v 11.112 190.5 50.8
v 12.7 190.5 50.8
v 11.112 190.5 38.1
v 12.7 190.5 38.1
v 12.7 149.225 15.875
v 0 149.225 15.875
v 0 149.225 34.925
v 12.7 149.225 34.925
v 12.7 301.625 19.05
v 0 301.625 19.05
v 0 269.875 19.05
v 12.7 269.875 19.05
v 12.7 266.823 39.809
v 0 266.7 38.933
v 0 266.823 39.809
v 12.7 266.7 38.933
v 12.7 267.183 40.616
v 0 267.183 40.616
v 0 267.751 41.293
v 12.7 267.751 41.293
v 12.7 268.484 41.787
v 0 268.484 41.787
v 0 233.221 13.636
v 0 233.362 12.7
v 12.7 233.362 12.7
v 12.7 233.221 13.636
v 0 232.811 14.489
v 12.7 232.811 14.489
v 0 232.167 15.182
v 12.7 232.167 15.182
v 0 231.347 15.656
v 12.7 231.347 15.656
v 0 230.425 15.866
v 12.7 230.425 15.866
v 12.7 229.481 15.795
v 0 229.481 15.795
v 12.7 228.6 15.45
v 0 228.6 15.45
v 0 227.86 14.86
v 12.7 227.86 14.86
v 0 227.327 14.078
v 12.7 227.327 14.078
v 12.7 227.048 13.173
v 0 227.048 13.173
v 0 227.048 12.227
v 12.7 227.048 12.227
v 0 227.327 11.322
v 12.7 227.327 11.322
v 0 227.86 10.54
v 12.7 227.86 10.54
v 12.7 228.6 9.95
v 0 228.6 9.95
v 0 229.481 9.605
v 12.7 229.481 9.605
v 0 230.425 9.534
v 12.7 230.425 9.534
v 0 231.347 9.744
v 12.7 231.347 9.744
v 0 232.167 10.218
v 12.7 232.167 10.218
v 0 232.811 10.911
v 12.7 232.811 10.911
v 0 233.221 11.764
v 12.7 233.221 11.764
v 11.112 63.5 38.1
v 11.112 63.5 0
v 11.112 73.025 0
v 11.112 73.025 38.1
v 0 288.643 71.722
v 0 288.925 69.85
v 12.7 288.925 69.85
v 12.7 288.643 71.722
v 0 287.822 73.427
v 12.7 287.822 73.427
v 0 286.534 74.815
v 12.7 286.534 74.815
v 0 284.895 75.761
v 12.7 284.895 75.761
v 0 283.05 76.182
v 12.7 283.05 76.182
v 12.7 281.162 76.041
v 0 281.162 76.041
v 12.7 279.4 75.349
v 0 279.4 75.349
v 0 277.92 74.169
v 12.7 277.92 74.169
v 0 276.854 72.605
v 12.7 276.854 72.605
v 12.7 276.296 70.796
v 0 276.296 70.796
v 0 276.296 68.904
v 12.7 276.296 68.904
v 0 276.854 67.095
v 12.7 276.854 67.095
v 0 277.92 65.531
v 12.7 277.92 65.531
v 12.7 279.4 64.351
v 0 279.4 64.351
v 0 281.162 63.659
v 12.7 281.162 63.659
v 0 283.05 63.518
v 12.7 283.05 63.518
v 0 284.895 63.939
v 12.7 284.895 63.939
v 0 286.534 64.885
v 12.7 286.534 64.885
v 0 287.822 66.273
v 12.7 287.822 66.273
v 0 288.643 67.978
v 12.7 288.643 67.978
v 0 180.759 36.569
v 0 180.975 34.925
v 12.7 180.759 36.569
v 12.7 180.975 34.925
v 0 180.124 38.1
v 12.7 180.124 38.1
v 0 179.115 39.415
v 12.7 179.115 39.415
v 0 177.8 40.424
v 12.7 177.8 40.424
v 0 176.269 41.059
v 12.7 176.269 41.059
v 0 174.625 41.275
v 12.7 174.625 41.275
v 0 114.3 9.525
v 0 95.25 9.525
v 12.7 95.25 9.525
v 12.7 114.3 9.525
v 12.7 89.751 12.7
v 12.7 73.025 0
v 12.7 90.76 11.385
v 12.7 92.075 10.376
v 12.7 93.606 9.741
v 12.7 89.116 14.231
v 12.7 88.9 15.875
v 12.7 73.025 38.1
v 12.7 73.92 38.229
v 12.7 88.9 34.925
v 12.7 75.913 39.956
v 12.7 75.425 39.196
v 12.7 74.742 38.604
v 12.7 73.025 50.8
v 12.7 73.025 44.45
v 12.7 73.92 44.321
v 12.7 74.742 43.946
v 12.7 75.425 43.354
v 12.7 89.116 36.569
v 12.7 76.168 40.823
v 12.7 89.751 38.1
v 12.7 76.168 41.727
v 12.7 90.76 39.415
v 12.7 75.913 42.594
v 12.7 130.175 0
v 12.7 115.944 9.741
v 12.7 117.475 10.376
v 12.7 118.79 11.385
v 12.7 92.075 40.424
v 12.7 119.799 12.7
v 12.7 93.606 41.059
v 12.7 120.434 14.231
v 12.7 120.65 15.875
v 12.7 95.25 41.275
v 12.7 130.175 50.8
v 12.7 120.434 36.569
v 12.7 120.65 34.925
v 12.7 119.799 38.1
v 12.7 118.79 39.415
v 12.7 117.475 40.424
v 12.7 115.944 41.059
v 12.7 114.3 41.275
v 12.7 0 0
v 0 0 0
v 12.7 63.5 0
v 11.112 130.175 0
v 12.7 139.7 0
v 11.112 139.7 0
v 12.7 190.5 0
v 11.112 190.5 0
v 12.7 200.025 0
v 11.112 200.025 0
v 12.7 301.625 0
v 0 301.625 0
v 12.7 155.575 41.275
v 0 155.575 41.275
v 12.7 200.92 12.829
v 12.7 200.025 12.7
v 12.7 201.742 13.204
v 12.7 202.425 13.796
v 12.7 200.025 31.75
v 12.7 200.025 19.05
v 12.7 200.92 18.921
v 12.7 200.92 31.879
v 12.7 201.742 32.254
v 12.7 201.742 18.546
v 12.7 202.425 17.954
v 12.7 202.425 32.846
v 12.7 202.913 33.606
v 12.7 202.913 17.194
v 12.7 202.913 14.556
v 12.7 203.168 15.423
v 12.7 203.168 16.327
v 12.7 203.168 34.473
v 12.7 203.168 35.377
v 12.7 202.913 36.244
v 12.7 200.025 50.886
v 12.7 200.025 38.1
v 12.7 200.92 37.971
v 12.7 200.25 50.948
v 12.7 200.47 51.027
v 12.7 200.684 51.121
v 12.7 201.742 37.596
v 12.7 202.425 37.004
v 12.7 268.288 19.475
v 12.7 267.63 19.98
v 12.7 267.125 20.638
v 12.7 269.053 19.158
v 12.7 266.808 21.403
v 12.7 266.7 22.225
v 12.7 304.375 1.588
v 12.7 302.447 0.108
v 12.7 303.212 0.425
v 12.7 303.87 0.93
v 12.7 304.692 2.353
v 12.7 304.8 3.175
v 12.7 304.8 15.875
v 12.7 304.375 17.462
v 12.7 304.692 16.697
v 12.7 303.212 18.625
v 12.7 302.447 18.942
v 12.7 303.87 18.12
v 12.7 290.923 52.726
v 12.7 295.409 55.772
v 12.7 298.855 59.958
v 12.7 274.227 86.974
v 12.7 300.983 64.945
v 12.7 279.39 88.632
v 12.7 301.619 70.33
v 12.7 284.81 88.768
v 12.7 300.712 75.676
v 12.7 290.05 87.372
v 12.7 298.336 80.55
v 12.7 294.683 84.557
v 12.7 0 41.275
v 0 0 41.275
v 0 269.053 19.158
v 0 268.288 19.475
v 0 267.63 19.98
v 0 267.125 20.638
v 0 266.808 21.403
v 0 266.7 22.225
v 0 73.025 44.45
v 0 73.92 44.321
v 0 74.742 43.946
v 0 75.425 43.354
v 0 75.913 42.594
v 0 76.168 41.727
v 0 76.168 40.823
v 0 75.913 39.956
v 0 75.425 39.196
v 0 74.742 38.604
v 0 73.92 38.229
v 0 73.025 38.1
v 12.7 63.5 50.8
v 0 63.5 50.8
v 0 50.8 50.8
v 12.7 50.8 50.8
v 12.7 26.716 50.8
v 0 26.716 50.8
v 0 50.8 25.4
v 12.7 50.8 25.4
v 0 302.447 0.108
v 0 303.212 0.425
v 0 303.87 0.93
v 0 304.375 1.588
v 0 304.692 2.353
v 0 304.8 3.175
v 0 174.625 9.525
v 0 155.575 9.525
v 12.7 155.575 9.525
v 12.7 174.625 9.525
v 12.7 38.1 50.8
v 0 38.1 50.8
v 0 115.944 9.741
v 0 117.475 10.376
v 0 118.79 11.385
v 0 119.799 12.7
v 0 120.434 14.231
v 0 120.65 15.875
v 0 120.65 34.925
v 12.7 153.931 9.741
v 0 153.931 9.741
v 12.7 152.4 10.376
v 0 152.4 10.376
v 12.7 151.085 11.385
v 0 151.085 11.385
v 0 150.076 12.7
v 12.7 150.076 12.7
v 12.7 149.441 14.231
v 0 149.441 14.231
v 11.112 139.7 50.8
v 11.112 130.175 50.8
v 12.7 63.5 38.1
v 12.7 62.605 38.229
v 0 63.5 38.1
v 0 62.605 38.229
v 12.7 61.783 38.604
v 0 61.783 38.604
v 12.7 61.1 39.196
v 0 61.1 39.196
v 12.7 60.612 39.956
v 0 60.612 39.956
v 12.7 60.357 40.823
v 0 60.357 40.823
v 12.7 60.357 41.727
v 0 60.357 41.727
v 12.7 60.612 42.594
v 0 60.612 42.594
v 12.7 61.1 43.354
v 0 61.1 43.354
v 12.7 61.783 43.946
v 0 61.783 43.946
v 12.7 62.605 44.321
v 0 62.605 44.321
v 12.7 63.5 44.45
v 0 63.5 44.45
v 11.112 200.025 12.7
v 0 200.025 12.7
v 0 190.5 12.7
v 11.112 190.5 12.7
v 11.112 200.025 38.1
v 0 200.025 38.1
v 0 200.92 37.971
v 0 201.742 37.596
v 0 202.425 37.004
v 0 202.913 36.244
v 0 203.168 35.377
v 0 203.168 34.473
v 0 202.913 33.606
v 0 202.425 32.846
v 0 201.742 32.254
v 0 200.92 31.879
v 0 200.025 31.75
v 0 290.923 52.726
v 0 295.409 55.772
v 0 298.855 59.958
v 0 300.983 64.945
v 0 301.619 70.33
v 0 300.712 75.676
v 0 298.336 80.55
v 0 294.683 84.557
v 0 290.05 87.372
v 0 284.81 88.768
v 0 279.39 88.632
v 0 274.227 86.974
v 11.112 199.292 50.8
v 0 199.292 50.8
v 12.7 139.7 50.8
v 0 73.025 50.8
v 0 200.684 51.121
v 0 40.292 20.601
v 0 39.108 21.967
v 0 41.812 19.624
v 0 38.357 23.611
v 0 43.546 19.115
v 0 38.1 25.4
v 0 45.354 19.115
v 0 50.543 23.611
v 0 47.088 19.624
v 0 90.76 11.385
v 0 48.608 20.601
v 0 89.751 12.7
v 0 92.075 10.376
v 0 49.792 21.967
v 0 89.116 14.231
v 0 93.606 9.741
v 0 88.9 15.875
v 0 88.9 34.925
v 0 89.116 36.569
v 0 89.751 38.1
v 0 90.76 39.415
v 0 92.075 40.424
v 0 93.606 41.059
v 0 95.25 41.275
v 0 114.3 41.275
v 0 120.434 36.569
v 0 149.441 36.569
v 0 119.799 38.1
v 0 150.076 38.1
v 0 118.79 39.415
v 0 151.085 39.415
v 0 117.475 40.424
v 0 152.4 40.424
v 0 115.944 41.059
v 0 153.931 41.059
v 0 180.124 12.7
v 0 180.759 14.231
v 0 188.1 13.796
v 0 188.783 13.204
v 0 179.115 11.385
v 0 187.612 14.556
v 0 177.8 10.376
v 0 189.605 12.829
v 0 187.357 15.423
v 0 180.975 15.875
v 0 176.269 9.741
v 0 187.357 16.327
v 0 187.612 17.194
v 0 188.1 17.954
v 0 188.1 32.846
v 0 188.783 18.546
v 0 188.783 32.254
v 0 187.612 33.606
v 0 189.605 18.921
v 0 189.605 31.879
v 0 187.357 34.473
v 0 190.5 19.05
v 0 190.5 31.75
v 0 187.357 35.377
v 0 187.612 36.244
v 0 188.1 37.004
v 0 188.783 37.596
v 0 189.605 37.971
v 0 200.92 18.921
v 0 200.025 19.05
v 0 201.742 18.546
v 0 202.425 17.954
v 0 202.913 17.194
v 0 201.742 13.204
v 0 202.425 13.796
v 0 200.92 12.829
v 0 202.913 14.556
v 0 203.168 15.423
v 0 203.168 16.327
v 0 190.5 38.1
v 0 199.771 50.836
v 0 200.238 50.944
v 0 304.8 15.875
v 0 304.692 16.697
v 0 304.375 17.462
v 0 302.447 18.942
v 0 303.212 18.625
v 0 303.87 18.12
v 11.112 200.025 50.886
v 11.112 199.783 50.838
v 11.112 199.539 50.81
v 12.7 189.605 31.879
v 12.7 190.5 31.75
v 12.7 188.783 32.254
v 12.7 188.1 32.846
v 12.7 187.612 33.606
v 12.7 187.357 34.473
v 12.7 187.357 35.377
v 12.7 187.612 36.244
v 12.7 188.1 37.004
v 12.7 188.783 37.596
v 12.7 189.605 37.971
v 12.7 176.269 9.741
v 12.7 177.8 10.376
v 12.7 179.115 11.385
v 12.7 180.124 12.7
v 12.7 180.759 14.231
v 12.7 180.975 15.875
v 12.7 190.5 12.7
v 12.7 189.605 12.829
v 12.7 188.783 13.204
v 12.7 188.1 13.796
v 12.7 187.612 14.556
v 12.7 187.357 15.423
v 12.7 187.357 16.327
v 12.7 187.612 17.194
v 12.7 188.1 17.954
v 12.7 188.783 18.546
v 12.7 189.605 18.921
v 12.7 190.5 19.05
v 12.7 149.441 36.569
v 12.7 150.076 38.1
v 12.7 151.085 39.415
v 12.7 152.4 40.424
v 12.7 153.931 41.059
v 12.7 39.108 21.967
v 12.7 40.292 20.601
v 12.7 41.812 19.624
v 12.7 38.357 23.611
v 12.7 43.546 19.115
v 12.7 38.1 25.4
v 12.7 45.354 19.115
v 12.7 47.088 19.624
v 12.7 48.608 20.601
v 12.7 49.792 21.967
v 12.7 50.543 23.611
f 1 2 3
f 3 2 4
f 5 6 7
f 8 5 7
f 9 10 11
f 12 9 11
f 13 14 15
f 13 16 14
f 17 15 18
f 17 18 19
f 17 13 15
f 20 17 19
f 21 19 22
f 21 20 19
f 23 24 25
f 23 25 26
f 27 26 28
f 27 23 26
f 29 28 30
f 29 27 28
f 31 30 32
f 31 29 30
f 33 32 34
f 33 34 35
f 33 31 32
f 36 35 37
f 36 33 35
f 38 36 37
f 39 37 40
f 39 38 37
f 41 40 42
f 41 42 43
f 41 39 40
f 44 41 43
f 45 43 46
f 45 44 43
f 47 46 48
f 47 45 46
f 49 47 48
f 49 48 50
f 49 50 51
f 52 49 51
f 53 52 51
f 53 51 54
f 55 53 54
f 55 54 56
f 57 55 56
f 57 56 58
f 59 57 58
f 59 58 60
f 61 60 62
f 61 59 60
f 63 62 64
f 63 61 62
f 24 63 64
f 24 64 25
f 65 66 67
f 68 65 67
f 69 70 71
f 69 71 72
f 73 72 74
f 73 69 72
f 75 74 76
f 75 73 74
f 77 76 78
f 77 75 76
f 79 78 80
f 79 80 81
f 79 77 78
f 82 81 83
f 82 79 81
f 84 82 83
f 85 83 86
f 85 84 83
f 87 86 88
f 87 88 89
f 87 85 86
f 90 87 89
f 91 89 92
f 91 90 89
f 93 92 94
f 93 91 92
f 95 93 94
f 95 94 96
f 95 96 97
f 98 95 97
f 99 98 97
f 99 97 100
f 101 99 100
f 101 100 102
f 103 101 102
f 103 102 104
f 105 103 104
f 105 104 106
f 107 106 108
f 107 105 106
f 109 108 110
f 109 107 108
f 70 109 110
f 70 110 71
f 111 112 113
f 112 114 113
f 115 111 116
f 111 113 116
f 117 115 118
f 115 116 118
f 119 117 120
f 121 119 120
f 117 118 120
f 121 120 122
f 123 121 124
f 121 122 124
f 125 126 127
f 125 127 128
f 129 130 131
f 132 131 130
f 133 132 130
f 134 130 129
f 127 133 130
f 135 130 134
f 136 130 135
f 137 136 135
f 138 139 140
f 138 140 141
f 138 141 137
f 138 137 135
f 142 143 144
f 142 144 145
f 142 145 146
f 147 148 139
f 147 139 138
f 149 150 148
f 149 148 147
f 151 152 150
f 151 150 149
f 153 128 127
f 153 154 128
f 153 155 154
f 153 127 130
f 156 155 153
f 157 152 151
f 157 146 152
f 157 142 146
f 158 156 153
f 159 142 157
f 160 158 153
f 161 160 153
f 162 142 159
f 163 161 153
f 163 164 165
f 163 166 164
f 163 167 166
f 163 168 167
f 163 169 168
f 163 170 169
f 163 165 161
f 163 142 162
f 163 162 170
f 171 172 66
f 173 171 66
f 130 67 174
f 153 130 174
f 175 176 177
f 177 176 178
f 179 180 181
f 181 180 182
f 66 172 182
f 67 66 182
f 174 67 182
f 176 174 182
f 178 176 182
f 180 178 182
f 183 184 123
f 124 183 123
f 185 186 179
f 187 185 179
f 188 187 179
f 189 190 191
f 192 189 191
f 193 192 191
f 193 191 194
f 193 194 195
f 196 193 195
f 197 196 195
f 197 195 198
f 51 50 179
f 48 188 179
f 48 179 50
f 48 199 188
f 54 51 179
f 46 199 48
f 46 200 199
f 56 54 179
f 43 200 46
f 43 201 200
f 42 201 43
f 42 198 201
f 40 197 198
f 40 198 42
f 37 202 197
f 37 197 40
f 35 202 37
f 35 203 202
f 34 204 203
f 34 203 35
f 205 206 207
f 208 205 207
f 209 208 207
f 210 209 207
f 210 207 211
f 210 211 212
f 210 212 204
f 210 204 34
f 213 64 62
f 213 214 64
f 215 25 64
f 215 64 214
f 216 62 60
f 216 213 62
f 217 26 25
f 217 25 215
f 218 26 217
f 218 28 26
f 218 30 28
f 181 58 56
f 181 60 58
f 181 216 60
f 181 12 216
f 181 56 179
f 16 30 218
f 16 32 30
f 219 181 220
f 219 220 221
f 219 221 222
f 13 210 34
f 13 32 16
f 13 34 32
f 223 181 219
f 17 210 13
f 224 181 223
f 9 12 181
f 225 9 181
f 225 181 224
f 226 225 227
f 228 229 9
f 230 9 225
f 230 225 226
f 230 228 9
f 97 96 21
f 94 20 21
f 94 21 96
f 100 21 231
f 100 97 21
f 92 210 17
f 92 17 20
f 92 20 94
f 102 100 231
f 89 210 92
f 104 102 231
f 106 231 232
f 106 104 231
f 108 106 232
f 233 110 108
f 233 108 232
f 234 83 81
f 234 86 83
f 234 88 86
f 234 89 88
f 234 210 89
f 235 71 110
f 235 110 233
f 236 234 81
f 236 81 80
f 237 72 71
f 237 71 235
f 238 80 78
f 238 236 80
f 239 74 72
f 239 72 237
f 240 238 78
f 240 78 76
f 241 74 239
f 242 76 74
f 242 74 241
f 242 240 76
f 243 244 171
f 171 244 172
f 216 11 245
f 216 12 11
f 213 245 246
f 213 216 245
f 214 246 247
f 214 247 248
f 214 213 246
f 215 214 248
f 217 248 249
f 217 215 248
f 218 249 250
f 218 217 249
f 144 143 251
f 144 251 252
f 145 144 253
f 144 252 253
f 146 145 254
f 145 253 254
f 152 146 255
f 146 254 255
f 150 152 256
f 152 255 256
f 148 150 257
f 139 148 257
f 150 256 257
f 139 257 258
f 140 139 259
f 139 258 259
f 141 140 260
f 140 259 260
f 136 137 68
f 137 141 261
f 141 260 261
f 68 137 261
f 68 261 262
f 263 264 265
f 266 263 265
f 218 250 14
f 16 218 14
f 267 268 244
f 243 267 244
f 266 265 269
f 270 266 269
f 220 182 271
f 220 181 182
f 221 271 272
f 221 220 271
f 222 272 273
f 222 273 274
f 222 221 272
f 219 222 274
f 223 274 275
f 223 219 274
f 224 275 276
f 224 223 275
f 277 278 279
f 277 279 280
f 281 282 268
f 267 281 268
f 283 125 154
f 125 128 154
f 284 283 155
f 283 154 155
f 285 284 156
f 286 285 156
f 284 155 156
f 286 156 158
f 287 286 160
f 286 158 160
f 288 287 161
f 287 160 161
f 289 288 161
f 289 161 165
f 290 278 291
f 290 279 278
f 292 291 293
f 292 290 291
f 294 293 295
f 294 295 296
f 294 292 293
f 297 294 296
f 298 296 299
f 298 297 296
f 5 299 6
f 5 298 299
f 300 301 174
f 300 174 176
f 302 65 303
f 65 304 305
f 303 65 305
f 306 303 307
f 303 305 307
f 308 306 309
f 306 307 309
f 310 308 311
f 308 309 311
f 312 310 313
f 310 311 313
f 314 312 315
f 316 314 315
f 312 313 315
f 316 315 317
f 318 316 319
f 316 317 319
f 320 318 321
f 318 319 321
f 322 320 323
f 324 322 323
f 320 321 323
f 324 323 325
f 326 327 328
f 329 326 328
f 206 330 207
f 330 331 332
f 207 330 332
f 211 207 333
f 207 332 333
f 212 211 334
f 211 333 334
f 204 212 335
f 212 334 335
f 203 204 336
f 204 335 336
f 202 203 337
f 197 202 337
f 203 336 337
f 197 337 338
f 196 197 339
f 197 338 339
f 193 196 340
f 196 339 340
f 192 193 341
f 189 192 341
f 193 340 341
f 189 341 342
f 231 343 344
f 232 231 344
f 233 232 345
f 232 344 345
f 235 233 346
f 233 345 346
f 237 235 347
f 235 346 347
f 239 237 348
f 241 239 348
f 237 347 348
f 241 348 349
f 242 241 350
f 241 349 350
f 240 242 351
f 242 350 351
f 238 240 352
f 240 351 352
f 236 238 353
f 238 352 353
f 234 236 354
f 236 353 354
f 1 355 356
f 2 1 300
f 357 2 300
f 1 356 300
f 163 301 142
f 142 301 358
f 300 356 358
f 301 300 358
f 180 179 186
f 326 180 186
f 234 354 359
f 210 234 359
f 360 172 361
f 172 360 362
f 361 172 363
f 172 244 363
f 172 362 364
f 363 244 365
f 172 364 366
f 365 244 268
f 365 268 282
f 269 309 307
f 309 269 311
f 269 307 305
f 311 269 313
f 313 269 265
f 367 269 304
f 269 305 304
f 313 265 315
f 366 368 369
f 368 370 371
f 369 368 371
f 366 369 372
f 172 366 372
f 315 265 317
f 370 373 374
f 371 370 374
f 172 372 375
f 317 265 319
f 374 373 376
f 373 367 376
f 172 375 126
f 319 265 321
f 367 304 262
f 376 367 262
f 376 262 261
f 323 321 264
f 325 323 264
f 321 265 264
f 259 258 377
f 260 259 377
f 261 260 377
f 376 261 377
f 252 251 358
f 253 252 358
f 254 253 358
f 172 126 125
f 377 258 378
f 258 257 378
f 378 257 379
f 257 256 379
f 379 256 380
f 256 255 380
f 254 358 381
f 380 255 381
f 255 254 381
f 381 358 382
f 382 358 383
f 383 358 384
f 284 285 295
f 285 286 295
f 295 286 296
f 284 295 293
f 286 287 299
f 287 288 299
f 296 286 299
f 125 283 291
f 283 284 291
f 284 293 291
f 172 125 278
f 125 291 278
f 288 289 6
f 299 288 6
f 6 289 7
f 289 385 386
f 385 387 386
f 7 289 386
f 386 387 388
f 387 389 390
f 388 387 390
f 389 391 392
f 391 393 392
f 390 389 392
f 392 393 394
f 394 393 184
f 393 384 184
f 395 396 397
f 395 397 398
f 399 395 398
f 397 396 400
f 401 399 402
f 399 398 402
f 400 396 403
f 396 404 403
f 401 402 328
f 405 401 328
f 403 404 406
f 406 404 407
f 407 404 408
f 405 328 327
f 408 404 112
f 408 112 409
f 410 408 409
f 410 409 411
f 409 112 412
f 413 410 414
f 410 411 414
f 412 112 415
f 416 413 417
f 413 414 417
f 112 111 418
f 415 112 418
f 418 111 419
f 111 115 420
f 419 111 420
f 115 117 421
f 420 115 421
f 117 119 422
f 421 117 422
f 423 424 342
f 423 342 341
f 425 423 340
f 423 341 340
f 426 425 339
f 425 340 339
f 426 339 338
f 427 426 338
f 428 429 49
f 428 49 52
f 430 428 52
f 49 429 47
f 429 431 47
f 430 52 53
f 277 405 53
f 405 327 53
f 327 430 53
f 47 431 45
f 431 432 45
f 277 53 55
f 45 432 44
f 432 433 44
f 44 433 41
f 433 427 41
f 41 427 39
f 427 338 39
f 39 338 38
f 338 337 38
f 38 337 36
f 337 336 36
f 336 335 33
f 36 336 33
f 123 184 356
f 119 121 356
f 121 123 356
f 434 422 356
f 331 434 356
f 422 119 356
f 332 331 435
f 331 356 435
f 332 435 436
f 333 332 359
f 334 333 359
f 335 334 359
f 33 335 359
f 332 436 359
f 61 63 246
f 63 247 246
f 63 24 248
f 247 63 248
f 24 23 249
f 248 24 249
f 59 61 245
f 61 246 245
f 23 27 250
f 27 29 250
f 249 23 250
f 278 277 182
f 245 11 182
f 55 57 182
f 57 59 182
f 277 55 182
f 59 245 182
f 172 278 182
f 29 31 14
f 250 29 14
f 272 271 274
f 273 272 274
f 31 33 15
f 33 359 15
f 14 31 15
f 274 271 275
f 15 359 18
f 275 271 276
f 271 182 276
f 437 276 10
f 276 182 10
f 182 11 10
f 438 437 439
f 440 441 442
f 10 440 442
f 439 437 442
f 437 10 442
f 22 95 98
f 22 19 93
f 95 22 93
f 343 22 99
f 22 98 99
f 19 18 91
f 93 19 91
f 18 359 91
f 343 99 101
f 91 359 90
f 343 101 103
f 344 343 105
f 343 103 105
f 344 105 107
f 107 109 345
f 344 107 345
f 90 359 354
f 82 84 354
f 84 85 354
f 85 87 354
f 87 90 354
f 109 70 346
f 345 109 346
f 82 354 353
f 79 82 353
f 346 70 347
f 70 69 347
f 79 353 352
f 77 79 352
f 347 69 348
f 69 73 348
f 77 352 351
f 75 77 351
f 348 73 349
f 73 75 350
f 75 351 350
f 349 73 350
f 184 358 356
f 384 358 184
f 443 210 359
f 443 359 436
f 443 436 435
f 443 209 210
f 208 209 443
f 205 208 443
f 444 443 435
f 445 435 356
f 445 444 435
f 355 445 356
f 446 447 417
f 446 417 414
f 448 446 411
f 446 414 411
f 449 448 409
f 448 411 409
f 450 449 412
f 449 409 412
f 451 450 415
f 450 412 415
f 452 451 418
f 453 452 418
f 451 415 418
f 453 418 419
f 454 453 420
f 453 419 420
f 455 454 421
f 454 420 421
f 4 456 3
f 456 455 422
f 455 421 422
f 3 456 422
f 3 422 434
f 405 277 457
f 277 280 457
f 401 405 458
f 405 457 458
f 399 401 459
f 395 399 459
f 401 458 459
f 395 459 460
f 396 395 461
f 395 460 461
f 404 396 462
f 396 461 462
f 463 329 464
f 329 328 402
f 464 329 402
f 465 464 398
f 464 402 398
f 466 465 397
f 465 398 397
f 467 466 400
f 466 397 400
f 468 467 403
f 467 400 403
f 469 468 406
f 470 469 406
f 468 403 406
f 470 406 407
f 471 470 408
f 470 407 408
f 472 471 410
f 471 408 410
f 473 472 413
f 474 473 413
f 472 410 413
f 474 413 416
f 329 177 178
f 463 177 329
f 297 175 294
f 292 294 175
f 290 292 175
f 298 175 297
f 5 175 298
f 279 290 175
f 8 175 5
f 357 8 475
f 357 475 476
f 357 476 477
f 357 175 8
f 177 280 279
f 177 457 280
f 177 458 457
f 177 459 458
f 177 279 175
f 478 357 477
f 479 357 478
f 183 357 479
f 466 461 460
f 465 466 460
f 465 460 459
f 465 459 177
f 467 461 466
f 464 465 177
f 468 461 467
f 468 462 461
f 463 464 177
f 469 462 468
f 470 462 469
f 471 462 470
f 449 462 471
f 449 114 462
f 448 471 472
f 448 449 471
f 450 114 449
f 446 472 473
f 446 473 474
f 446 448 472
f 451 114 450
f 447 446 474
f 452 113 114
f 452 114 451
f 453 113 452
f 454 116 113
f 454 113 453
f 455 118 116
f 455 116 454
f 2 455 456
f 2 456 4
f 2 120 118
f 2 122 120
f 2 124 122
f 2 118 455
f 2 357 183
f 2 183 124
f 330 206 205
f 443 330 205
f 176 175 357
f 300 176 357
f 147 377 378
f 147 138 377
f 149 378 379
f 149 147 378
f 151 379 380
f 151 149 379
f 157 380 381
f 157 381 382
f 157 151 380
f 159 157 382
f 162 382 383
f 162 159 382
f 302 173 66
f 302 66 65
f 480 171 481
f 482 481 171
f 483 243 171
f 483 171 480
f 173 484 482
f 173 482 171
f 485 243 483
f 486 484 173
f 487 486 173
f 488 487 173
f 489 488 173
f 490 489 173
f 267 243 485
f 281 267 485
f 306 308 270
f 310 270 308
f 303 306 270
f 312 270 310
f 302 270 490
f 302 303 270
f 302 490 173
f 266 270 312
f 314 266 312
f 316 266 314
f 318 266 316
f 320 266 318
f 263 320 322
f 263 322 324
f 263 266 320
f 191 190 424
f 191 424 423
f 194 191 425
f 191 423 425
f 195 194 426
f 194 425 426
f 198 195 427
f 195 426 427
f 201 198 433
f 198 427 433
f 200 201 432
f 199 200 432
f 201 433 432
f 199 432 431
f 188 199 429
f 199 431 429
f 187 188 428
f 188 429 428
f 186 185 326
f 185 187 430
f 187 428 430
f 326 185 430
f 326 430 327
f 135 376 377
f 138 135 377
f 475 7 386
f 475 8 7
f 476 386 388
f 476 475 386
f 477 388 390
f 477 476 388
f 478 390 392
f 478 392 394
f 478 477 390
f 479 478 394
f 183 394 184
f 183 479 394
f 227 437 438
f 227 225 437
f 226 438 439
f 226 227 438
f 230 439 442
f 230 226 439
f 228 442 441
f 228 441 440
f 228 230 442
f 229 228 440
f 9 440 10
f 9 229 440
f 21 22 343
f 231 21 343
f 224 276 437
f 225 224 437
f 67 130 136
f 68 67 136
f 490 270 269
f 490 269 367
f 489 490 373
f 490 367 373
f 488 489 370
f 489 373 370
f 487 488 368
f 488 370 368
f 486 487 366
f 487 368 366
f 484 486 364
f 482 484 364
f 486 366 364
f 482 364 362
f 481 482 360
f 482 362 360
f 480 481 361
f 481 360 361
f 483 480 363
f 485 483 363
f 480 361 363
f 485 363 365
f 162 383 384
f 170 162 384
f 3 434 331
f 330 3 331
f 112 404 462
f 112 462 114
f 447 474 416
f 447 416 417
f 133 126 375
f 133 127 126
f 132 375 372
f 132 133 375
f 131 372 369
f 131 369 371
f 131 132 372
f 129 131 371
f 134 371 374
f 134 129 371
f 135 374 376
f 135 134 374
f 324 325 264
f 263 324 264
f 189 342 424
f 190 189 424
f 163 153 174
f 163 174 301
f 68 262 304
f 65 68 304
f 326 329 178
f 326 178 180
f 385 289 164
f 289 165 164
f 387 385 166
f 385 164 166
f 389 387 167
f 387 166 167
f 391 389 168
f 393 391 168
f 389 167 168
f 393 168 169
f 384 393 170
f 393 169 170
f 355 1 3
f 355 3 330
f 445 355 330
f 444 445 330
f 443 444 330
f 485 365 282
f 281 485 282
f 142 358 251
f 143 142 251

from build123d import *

# Parameters (mm, degrees)
F0_W     = 31.75
F0_H     = 31.75
F0_W_2   = 9.525
F0_H_2   = 50.8
F0_R     = 3.175
F0_R_2   = 6.35
F1_DEPTH = 12.7
F2_R     = 3.175
F3_W     = 9.525
F3_H     = 38.1
F4_DEPTH = 1.5875
F5_W     = 9.525
F5_H     = 12.7
F6_DEPTH = 1.5875
F7_W     = 9.525
F7_H     = 50.8
F8_DEPTH = 1.5875
F9_R     = 6.35


with BuildPart() as f1:
    # F0 (on Right) → F1 (new body)
    with BuildSketch(Plane.YZ):
        with BuildLine():
            Line((0, 41.275), (0, 0))
            Line((0, 0), (130.175, 0))
            Line((130.175, 0), (130.175, 50.8))
            Line((130.175, 50.8), (73.025, 50.8))
            Line((73.025, 50.8), (73.025, 44.45))
            ThreePointArc((73.025, 44.45), (76.2, 41.275), (73.025, 38.1))
            Line((73.025, 38.1), (63.5, 38.1))
            ThreePointArc((63.5, 38.1), (60.325, 41.275), (63.5, 44.45))
            Line((63.5, 44.45), (63.5, 50.8))
            Line((63.5, 50.8), (50.8, 50.8))
            Line((50.8, 50.8), (50.8, 25.4))
            ThreePointArc((50.8, 25.4), (44.45, 19.05), (38.1, 25.4))
            Line((38.1, 25.4), (38.1, 50.8))
            Line((38.1, 50.8), (26.7157145118, 50.8))
            Line((26.7157145118, 50.8), (0, 41.275))
        make_face()
        with Locations((104.775, 25.4)):
            Rectangle(F0_W, F0_H, mode=Mode.SUBTRACT)
        with Locations((134.9375, 25.4)):
            Rectangle(F0_W_2, F0_H_2)
        with BuildLine():
            Line((139.7, 50.8), (139.7, 0))
            Line((139.7, 0), (304.8, 0))
            Line((304.8, 0), (304.8, 19.05))
            Line((304.8, 19.05), (266.7, 19.05))
            Line((266.7, 19.05), (266.7, 40.9178125))
            Line((266.7, 40.9178125), (290.922752809, 52.7264044944))
            ThreePointArc((290.922752809, 52.7264044944), (299.6985955056, 78.197752809), (274.227247191, 86.9735955056))
            Line((274.227247191, 86.9735955056), (200.025, 50.8))
            Line((200.025, 50.8), (139.7, 50.8))
        make_face()
        with Locations((230.1875, 12.7)):
            Circle(F0_R, mode=Mode.SUBTRACT)
        with Locations((165.1, 25.4)):
            Rectangle(F0_W, F0_H, mode=Mode.SUBTRACT)
        with BuildLine():
            Line((190.5, 38.1), (200.025, 38.1))
            ThreePointArc((200.025, 38.1), (203.2, 34.925), (200.025, 31.75))
            Line((200.025, 31.75), (200.025, 19.05))
            ThreePointArc((200.025, 19.05), (203.2, 15.875), (200.025, 12.7))
            Line((200.025, 12.7), (190.5, 12.7))
            ThreePointArc((190.5, 12.7), (187.325, 15.875), (190.5, 19.05))
            Line((190.5, 19.05), (190.5, 31.75))
            ThreePointArc((190.5, 31.75), (187.325, 34.925), (190.5, 38.1))
        make_face(mode=Mode.SUBTRACT)
        with Locations((282.575, 69.85)):
            Circle(F0_R_2, mode=Mode.SUBTRACT)
    extrude(amount=F1_DEPTH)

    # F2
    f2_edges = [f1.edges().sort_by_distance(p)[0] for p in [
        (6.35, 200.025, 50.8),
        (6.35, 266.7, 40.917812),
        (6.35, 266.7, 19.05),
        (6.35, 304.8, 19.05),
        (6.35, 304.8, 0),
    ]]
    fillet(f2_edges, radius=F2_R)

    # F3 (on face) → F4 (cut)
    with BuildSketch(Plane.YZ.offset(12.7)):
        with Locations((68.2625, 19.05)):
            Rectangle(F3_W, F3_H)
    extrude(amount=-F4_DEPTH, mode=Mode.SUBTRACT)

    # F5 (on face) → F6 (cut)
    with BuildSketch(Plane.YZ.offset(12.7)):
        with Locations((195.2625, 6.35)):
            Rectangle(F5_W, F5_H)
        with BuildLine():
            ThreePointArc((199.2923076923, 50.8), (199.6611512097, 50.8214972713), (200.025, 50.8856979781))
            Line((200.025, 50.8856979781), (200.025, 52.109055835))
            Line((200.025, 52.109055835), (190.5, 52.109055835))
            Line((190.5, 52.109055835), (190.5, 50.8))
            Line((190.5, 50.8), (199.2923076923, 50.8))
        make_face()
        with BuildLine():
            Line((190.5, 38.1), (200.025, 38.1))
            Line((200.025, 38.1), (200.025, 50.8856979781))
            ThreePointArc((200.025, 50.8856979781), (199.6611512097, 50.8214972713), (199.2923076923, 50.8))
            Line((199.2923076923, 50.8), (190.5, 50.8))
            Line((190.5, 50.8), (190.5, 38.1))
        make_face()
    extrude(amount=-F6_DEPTH, mode=Mode.SUBTRACT)

    # F7 (on face) → F8 (cut)
    with BuildSketch(Plane.YZ.offset(12.7)):
        with Locations((134.9375, 25.4)):
            Rectangle(F7_W, F7_H)
    extrude(amount=-F8_DEPTH, mode=Mode.SUBTRACT)

    # F9
    f9_edges = [f1.edges().sort_by_distance(p)[0] for p in [
        (6.35, 88.9, 41.275),
        (6.35, 120.65, 41.275),
        (6.35, 180.975, 41.275),
        (6.35, 149.225, 41.275),
        (6.35, 149.225, 9.525),
        (6.35, 88.9, 9.525),
        (6.35, 180.975, 9.525),
        (6.35, 120.65, 9.525),
    ]]
    fillet(f9_edges, radius=F9_R)


solid = f1.part
